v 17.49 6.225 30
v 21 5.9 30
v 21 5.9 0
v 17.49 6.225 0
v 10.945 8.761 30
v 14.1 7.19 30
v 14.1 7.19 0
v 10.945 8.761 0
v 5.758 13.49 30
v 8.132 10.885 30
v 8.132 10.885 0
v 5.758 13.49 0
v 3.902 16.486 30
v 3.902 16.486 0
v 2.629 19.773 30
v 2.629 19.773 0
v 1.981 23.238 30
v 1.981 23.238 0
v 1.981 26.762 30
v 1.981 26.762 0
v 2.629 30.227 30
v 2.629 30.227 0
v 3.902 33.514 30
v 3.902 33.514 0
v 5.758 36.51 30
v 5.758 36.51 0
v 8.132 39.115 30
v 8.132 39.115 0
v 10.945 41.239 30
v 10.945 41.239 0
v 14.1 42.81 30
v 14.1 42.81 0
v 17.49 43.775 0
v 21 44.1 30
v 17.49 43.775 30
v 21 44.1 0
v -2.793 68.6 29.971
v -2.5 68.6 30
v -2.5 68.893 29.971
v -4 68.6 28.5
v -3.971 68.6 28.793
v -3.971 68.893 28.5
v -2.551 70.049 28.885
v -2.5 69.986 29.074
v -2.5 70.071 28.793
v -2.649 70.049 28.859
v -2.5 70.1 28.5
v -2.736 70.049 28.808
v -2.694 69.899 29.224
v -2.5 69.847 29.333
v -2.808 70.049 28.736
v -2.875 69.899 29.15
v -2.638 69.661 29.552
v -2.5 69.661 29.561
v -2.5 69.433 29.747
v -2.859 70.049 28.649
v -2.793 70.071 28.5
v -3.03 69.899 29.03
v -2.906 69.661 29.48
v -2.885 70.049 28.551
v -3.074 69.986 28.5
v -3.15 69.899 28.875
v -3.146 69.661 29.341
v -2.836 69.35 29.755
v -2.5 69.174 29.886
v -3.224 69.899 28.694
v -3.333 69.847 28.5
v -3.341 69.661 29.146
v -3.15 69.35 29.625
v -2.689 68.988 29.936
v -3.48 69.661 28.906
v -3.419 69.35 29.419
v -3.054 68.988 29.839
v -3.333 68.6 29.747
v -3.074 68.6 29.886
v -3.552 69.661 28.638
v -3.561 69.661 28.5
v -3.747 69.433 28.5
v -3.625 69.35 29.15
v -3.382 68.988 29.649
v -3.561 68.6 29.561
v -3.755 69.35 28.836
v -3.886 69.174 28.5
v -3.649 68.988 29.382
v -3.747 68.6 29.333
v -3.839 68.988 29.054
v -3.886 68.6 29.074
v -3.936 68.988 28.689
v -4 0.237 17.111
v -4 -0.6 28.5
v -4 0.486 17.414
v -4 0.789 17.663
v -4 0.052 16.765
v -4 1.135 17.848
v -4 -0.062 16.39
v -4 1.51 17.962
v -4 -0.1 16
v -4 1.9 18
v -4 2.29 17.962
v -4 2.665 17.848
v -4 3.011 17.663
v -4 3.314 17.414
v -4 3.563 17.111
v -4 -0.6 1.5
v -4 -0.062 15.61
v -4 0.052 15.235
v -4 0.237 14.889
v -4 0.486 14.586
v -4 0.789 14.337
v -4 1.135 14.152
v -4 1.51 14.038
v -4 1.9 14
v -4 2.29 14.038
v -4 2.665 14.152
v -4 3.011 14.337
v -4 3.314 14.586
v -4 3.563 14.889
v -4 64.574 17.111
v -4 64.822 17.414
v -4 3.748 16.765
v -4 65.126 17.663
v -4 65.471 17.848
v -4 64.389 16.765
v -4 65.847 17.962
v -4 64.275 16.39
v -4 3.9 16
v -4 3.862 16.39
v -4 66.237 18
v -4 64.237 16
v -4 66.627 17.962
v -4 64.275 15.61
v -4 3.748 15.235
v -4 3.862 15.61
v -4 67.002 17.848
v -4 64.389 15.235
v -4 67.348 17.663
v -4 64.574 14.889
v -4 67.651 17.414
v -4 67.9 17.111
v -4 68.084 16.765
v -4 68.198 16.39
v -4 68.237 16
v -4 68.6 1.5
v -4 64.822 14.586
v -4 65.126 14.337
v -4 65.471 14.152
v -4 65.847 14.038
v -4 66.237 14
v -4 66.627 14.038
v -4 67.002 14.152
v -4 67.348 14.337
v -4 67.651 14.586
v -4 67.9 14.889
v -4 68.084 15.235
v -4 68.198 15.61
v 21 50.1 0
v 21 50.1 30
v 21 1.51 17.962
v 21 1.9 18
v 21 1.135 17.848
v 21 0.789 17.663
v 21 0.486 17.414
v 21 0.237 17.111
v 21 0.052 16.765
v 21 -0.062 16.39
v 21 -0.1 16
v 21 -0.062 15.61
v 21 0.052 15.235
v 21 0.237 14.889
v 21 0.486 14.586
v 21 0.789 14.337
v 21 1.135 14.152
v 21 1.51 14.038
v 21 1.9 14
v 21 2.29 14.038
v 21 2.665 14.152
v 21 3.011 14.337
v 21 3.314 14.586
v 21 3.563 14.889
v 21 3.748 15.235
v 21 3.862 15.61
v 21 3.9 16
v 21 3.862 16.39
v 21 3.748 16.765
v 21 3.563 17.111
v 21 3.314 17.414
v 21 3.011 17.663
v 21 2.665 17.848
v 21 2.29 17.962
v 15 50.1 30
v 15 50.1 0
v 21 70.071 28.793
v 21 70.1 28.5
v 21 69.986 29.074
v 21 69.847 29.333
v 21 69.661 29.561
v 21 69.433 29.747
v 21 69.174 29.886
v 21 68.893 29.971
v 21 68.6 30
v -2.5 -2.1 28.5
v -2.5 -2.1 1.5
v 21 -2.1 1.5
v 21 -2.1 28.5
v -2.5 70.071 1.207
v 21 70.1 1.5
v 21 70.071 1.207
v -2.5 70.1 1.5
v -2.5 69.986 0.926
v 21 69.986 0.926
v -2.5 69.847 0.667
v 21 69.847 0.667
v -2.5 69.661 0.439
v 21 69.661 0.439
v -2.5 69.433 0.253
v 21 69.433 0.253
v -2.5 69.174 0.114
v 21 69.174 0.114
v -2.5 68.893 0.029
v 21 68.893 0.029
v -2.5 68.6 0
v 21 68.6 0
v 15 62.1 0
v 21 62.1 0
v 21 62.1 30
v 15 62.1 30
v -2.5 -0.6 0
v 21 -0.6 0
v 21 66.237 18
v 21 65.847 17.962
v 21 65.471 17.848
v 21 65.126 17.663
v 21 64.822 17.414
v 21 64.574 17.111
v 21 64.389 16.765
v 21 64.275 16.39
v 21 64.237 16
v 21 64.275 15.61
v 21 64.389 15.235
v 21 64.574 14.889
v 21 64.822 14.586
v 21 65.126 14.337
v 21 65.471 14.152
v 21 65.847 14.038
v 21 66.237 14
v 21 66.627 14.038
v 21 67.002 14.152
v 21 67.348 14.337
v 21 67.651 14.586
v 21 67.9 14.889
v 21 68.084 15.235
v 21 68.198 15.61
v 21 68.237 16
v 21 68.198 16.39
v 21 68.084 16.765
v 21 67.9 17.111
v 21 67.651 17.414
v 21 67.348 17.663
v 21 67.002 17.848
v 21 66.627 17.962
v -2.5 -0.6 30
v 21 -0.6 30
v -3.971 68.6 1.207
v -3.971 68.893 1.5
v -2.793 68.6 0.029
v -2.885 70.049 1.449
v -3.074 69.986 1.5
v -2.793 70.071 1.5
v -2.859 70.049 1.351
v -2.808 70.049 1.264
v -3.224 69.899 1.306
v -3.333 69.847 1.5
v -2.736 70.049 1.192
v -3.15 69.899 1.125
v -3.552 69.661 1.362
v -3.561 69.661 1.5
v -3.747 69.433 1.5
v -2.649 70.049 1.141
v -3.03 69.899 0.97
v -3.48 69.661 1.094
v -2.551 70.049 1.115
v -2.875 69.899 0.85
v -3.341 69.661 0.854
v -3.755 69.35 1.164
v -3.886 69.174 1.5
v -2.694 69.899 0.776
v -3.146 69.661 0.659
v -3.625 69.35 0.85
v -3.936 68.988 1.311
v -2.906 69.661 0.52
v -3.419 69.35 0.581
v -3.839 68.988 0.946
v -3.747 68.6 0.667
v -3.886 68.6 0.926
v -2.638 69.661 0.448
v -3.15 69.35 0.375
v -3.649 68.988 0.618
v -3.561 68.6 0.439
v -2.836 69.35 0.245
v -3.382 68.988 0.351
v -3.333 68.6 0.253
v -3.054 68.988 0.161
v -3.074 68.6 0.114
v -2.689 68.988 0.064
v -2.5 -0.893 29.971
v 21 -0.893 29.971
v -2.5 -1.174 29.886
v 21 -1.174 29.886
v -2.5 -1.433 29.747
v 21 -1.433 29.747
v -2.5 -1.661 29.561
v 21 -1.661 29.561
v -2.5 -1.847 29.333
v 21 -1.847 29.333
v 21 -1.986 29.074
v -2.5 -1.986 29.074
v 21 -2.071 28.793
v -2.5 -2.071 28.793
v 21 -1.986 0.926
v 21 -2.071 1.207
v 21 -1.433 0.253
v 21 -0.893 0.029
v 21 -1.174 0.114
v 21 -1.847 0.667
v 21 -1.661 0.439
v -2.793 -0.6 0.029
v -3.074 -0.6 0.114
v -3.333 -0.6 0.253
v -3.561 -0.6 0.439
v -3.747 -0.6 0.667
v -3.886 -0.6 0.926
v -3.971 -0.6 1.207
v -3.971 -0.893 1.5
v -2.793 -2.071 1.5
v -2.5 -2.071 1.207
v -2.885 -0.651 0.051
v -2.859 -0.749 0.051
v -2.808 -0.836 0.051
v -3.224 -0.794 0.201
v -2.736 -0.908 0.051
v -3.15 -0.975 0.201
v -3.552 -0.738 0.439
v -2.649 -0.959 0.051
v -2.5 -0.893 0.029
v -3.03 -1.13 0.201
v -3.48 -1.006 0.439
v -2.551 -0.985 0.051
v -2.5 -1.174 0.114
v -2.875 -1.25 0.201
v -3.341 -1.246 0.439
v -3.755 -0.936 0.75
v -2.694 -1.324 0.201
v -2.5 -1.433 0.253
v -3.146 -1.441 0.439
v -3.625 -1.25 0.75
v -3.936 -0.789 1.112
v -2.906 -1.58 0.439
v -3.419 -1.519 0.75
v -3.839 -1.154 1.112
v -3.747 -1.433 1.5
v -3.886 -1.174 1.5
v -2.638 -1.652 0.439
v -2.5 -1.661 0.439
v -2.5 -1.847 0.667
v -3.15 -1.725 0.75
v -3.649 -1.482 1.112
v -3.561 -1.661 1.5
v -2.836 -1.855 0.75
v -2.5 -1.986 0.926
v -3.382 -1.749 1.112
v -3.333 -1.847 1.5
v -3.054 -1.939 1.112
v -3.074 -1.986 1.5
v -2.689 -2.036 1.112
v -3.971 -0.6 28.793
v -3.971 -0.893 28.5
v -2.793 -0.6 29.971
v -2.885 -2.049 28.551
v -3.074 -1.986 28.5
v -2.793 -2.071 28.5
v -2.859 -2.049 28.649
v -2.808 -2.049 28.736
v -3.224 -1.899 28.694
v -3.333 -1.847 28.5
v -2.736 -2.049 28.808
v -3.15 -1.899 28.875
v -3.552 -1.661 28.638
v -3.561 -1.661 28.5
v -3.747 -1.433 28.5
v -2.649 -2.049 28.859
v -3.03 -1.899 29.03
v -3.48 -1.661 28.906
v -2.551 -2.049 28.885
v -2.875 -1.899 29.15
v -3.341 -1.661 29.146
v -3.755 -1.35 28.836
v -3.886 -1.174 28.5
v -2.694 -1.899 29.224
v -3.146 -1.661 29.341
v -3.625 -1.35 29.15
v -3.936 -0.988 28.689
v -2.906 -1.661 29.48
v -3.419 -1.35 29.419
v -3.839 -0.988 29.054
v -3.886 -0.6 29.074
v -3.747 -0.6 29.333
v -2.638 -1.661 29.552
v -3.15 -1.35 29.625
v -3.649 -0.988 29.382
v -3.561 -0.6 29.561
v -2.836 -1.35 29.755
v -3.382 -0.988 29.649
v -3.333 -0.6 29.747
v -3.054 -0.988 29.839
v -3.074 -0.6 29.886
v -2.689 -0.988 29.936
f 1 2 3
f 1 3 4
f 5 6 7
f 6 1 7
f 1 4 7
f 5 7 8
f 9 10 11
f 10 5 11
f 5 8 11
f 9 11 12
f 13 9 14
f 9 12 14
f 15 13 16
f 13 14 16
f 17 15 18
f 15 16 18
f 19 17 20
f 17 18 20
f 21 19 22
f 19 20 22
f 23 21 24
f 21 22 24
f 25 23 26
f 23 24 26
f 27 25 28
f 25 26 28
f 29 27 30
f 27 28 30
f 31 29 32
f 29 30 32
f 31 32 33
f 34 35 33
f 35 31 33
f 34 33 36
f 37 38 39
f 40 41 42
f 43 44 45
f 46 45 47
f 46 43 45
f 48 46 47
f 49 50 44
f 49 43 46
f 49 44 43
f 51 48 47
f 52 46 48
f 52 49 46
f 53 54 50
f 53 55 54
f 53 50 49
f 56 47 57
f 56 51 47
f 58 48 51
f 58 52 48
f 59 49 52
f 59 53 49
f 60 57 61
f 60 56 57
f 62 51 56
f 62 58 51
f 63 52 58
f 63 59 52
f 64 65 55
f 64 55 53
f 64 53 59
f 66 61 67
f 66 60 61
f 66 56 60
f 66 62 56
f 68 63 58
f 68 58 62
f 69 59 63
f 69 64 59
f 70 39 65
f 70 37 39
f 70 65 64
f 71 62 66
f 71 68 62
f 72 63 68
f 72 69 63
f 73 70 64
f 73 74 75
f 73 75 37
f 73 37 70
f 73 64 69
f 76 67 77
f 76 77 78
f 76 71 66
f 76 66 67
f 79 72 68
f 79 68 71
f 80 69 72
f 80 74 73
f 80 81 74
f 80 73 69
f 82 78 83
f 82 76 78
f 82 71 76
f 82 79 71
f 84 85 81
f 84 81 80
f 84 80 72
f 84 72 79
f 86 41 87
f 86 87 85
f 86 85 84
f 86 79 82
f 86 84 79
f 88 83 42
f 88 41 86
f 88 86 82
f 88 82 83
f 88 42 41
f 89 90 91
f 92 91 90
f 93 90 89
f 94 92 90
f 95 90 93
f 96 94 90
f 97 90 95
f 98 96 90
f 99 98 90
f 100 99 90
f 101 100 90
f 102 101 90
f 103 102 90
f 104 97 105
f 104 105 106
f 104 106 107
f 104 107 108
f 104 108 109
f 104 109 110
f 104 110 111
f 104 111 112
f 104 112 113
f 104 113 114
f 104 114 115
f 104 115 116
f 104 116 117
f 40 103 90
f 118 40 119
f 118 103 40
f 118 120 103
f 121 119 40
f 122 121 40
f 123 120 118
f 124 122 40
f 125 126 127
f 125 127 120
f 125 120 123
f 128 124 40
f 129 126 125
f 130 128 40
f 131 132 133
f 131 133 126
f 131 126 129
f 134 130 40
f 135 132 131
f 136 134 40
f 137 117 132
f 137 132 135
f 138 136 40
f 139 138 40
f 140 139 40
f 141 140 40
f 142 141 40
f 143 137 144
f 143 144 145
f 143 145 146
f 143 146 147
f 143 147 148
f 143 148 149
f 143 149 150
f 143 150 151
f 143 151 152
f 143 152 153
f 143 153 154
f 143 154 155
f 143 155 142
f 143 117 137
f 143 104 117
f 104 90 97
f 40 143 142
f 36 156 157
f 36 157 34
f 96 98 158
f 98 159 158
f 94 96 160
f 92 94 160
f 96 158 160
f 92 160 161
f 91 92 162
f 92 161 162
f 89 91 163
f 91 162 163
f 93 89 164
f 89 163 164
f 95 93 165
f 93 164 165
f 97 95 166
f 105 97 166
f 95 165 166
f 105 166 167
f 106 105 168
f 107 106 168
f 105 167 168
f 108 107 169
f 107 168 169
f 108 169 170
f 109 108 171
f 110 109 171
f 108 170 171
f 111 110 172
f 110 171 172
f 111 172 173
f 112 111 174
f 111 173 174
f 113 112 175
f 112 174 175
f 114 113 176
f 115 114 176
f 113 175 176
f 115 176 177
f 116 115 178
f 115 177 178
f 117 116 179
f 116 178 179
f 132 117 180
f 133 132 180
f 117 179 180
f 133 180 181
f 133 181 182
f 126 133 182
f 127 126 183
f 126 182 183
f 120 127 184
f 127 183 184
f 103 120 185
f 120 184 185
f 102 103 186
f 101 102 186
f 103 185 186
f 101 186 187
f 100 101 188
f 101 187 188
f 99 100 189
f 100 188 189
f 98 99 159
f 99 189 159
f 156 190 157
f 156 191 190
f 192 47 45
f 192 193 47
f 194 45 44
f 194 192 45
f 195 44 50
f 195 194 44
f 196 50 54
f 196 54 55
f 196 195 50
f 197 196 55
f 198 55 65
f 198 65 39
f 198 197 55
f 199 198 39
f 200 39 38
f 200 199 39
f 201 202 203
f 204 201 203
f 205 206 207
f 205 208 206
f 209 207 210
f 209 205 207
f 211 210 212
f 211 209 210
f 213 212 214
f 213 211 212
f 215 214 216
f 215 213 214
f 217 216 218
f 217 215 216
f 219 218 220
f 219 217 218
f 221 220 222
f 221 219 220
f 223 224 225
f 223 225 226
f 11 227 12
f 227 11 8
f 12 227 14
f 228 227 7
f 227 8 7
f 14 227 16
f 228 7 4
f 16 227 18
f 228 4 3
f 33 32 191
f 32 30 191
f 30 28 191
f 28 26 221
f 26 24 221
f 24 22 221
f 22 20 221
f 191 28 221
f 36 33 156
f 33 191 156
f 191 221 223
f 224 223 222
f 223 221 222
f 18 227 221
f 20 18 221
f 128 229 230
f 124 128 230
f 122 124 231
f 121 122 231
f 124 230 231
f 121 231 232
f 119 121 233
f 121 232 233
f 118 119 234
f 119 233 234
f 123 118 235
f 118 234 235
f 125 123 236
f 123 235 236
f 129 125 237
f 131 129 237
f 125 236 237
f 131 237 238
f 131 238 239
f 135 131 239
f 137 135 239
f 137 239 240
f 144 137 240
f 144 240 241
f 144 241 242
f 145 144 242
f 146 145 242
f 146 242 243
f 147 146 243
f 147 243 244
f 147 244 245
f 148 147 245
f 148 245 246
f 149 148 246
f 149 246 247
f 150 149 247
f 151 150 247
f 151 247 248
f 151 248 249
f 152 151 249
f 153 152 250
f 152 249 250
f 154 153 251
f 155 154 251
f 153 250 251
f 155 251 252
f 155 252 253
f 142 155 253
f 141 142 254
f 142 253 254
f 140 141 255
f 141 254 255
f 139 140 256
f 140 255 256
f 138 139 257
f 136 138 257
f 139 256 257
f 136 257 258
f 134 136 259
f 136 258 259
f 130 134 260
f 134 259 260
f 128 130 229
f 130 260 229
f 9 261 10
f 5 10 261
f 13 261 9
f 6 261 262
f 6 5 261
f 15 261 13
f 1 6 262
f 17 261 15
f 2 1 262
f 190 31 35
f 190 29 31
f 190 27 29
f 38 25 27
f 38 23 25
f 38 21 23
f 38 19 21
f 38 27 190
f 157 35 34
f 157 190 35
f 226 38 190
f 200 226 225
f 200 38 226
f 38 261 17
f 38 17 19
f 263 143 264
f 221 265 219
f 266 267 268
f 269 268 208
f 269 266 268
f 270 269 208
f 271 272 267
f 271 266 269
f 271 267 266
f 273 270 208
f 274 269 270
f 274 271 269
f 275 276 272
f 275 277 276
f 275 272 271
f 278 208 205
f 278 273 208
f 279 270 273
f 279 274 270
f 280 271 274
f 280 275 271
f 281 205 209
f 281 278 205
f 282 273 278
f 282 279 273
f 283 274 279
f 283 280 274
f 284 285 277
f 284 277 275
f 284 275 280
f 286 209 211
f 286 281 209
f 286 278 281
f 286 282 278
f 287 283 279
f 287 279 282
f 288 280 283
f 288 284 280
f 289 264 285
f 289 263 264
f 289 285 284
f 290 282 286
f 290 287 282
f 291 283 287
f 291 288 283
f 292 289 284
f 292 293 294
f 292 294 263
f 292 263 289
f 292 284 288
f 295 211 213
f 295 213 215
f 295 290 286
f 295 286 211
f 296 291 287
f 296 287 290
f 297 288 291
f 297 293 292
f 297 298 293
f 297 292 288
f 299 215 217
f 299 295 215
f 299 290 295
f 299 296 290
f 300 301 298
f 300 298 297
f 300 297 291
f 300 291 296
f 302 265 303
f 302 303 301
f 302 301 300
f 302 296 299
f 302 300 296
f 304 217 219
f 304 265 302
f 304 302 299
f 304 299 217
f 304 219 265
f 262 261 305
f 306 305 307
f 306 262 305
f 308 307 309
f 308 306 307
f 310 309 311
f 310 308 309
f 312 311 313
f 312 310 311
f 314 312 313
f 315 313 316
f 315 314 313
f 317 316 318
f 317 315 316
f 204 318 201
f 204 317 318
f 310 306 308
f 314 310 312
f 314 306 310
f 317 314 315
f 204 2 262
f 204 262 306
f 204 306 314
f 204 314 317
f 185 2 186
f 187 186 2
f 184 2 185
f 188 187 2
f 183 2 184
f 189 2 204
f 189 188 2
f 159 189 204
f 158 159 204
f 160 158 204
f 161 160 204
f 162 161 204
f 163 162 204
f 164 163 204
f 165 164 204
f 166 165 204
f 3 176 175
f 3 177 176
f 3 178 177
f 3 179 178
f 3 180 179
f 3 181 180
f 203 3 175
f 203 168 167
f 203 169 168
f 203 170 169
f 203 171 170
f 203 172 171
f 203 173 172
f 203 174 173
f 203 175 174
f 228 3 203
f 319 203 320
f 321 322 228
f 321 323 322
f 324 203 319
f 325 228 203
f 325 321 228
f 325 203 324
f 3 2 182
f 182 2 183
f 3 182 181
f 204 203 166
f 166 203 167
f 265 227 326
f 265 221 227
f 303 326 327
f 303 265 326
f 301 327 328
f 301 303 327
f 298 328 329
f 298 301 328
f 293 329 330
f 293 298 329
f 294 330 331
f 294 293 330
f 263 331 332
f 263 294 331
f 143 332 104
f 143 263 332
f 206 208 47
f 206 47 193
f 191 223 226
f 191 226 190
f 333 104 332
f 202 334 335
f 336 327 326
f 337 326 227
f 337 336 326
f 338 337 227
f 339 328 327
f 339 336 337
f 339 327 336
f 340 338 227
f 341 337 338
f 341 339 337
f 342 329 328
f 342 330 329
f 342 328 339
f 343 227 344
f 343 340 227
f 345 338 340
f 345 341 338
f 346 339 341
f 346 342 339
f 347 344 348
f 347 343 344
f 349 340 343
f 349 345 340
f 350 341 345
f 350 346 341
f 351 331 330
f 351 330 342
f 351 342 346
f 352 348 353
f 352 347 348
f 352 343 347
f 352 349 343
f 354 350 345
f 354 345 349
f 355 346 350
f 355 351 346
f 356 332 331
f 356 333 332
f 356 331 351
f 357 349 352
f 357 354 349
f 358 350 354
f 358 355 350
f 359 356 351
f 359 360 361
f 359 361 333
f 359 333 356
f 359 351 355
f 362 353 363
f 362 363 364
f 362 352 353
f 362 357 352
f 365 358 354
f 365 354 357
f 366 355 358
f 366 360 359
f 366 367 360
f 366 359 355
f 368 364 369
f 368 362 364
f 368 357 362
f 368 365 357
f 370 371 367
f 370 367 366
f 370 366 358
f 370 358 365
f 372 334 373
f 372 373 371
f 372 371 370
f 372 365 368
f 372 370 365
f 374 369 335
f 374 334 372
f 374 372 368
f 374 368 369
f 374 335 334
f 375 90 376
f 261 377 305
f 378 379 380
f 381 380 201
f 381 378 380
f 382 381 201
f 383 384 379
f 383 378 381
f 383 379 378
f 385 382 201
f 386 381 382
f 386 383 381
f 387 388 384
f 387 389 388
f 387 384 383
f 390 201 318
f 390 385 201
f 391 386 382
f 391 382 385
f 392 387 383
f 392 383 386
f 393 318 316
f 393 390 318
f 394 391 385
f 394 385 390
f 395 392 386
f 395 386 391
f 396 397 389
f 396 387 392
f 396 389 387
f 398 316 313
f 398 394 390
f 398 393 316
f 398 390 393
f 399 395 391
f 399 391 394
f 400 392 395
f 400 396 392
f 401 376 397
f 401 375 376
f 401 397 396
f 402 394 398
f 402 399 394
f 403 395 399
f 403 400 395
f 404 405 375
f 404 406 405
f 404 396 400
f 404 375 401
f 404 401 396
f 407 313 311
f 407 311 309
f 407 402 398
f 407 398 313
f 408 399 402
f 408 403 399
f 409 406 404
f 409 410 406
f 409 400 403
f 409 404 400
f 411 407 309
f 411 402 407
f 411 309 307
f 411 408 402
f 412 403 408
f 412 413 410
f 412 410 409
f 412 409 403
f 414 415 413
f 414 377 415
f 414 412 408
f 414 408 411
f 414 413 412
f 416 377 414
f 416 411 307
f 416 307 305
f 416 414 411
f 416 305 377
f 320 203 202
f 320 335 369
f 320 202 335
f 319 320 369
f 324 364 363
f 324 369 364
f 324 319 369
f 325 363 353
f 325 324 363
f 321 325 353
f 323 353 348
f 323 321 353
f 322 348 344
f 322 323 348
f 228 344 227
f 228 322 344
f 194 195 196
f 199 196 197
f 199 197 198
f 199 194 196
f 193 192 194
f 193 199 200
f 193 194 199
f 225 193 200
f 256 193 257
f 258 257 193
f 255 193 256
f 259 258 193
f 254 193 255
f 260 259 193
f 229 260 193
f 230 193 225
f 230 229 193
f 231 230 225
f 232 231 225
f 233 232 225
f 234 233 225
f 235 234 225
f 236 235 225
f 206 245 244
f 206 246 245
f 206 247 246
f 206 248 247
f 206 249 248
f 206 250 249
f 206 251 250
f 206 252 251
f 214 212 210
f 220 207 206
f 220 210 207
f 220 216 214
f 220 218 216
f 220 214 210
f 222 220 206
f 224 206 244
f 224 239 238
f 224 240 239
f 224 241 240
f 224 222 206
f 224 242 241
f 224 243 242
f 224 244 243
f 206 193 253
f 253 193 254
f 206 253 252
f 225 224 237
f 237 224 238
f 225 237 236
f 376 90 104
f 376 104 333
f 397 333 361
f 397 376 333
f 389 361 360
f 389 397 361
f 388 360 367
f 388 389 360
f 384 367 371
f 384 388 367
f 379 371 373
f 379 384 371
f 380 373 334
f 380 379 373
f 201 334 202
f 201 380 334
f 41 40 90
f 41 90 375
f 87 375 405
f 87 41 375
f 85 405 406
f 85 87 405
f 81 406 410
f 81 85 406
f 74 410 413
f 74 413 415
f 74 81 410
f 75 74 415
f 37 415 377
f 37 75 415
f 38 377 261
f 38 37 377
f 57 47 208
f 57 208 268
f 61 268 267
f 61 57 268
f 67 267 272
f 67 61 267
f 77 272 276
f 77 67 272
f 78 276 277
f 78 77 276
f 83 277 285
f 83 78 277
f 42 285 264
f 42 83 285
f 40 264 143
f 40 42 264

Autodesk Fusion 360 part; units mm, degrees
sketch "Esboço1" plane through (0, 0, 0) normal (0, 0, 1) x (1, 0, 0)
  line L0 (15, 50.1) -> (21, 50.1)
  line L1 (15, 62.1) -> (15, 50.1)
  line L2 (-4, -2.1) -> (-4, 70.1)
  line L3 (-4, -2.1) -> (21, -2.1)
  line L4 (21, 70.1) -> (21, 62.1)
  line L5 (21, 62.1) -> (15, 62.1)
  line L6 (21, 5.9) -> (21, -2.1)
  line L7 (21, 50.1) -> (21, 44.1)
  arc A0 (21, 44.1) -> (21, 5.9) centre (21, 25) ccw
  line L8 (-4, 70.1) -> (21, 70.1)
  dimension "d2" = 12
  dimension "d3" = 6
  dimension "d5" = 8
  dimension "d8" = 6
  dimension "d10" = 8
  dimension "d36" = 25
  dimension "d12" = 6
  dimension "d13" = 19.1
extrude "Extrusão1" add sketch "Esboço1" along normal blind 30
hole "Furo1" at (-4, 66.2367, 16) direction (1, 0, 0) diameter 4 depth 25 tip angle 180
hole "Furo2" at (-4, 1.9, 16) direction (1, 0, 0) diameter 4 depth 25 tip angle 180
fillet "Arredondamento1" radius 1.5 5 edges at (-4, 34, 30) (-4, -2.1, 15) (8.5, -2.1, 30) (8.5, -2.1, 0) (-4, 34, 0)
fillet "Arredondamento2" radius 1.5 5 edges at (9.25, 70.1, 30) (-3.5607, 70.1, 29.5607) (-4, 70.1, 15) (-3.5607, 70.1, 0.4393) (9.25, 70.1, 0)
